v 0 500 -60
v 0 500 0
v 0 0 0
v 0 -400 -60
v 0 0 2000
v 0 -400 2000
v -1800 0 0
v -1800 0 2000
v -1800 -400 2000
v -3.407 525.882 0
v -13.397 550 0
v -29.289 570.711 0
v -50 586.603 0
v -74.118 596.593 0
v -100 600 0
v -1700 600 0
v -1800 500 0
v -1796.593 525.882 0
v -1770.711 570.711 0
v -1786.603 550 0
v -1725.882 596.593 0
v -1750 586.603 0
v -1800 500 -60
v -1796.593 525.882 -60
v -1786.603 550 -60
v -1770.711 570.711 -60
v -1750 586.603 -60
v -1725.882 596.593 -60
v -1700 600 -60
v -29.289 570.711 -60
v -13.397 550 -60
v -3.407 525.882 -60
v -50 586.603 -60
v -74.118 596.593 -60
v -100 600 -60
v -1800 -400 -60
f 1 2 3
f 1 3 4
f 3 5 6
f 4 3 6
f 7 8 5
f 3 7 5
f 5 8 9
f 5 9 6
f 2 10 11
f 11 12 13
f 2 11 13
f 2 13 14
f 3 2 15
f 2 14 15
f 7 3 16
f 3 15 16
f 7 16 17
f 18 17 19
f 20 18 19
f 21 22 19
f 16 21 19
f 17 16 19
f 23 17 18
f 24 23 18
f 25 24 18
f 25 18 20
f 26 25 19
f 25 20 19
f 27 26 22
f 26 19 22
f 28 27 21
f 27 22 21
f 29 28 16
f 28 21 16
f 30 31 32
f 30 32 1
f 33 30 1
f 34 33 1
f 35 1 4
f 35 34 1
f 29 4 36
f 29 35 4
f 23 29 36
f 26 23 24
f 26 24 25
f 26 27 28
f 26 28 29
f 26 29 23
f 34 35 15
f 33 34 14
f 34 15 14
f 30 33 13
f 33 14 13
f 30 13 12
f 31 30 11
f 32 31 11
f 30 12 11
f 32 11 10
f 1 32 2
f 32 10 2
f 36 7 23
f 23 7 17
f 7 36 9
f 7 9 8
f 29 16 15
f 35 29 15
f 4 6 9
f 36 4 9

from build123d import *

# Parameters (mm, degrees)
SKETCH_1_W      = 1800
SKETCH_1_H      = 2000
EXTRUDE_1_DEPTH = 400
EXTRUDE_2_DEPTH = 60


with BuildPart() as part:
    # 草图1 → 凸台-拉伸1 (new body)
    with BuildSketch(Plane(origin=(0, 0, 0), x_dir=(1, 0, 0), z_dir=(0, 1, 0))):
        with Locations((-900, -1000)):
            Rectangle(SKETCH_1_W, SKETCH_1_H)
    extrude(amount=-EXTRUDE_1_DEPTH)

    # 草图2 → 凸台-拉伸2 (add)
    with BuildSketch(Plane(origin=(0, 0, 0), x_dir=(-1, 0, 0), z_dir=(0, 0, -1))):
        with BuildLine():
            Line((1800, -400), (1800, 500))
            ThreePointArc((1800, 500), (1770.710678119, 570.710678119), (1700, 600))
            Line((1700, 600), (100, 600))
            ThreePointArc((100, 600), (29.289321881, 570.710678119), (0, 500))
            Line((0, 500), (0, -400))
            Line((0, -400), (1800, -400))
        make_face()
    extrude(amount=EXTRUDE_2_DEPTH)


solid = part.part
